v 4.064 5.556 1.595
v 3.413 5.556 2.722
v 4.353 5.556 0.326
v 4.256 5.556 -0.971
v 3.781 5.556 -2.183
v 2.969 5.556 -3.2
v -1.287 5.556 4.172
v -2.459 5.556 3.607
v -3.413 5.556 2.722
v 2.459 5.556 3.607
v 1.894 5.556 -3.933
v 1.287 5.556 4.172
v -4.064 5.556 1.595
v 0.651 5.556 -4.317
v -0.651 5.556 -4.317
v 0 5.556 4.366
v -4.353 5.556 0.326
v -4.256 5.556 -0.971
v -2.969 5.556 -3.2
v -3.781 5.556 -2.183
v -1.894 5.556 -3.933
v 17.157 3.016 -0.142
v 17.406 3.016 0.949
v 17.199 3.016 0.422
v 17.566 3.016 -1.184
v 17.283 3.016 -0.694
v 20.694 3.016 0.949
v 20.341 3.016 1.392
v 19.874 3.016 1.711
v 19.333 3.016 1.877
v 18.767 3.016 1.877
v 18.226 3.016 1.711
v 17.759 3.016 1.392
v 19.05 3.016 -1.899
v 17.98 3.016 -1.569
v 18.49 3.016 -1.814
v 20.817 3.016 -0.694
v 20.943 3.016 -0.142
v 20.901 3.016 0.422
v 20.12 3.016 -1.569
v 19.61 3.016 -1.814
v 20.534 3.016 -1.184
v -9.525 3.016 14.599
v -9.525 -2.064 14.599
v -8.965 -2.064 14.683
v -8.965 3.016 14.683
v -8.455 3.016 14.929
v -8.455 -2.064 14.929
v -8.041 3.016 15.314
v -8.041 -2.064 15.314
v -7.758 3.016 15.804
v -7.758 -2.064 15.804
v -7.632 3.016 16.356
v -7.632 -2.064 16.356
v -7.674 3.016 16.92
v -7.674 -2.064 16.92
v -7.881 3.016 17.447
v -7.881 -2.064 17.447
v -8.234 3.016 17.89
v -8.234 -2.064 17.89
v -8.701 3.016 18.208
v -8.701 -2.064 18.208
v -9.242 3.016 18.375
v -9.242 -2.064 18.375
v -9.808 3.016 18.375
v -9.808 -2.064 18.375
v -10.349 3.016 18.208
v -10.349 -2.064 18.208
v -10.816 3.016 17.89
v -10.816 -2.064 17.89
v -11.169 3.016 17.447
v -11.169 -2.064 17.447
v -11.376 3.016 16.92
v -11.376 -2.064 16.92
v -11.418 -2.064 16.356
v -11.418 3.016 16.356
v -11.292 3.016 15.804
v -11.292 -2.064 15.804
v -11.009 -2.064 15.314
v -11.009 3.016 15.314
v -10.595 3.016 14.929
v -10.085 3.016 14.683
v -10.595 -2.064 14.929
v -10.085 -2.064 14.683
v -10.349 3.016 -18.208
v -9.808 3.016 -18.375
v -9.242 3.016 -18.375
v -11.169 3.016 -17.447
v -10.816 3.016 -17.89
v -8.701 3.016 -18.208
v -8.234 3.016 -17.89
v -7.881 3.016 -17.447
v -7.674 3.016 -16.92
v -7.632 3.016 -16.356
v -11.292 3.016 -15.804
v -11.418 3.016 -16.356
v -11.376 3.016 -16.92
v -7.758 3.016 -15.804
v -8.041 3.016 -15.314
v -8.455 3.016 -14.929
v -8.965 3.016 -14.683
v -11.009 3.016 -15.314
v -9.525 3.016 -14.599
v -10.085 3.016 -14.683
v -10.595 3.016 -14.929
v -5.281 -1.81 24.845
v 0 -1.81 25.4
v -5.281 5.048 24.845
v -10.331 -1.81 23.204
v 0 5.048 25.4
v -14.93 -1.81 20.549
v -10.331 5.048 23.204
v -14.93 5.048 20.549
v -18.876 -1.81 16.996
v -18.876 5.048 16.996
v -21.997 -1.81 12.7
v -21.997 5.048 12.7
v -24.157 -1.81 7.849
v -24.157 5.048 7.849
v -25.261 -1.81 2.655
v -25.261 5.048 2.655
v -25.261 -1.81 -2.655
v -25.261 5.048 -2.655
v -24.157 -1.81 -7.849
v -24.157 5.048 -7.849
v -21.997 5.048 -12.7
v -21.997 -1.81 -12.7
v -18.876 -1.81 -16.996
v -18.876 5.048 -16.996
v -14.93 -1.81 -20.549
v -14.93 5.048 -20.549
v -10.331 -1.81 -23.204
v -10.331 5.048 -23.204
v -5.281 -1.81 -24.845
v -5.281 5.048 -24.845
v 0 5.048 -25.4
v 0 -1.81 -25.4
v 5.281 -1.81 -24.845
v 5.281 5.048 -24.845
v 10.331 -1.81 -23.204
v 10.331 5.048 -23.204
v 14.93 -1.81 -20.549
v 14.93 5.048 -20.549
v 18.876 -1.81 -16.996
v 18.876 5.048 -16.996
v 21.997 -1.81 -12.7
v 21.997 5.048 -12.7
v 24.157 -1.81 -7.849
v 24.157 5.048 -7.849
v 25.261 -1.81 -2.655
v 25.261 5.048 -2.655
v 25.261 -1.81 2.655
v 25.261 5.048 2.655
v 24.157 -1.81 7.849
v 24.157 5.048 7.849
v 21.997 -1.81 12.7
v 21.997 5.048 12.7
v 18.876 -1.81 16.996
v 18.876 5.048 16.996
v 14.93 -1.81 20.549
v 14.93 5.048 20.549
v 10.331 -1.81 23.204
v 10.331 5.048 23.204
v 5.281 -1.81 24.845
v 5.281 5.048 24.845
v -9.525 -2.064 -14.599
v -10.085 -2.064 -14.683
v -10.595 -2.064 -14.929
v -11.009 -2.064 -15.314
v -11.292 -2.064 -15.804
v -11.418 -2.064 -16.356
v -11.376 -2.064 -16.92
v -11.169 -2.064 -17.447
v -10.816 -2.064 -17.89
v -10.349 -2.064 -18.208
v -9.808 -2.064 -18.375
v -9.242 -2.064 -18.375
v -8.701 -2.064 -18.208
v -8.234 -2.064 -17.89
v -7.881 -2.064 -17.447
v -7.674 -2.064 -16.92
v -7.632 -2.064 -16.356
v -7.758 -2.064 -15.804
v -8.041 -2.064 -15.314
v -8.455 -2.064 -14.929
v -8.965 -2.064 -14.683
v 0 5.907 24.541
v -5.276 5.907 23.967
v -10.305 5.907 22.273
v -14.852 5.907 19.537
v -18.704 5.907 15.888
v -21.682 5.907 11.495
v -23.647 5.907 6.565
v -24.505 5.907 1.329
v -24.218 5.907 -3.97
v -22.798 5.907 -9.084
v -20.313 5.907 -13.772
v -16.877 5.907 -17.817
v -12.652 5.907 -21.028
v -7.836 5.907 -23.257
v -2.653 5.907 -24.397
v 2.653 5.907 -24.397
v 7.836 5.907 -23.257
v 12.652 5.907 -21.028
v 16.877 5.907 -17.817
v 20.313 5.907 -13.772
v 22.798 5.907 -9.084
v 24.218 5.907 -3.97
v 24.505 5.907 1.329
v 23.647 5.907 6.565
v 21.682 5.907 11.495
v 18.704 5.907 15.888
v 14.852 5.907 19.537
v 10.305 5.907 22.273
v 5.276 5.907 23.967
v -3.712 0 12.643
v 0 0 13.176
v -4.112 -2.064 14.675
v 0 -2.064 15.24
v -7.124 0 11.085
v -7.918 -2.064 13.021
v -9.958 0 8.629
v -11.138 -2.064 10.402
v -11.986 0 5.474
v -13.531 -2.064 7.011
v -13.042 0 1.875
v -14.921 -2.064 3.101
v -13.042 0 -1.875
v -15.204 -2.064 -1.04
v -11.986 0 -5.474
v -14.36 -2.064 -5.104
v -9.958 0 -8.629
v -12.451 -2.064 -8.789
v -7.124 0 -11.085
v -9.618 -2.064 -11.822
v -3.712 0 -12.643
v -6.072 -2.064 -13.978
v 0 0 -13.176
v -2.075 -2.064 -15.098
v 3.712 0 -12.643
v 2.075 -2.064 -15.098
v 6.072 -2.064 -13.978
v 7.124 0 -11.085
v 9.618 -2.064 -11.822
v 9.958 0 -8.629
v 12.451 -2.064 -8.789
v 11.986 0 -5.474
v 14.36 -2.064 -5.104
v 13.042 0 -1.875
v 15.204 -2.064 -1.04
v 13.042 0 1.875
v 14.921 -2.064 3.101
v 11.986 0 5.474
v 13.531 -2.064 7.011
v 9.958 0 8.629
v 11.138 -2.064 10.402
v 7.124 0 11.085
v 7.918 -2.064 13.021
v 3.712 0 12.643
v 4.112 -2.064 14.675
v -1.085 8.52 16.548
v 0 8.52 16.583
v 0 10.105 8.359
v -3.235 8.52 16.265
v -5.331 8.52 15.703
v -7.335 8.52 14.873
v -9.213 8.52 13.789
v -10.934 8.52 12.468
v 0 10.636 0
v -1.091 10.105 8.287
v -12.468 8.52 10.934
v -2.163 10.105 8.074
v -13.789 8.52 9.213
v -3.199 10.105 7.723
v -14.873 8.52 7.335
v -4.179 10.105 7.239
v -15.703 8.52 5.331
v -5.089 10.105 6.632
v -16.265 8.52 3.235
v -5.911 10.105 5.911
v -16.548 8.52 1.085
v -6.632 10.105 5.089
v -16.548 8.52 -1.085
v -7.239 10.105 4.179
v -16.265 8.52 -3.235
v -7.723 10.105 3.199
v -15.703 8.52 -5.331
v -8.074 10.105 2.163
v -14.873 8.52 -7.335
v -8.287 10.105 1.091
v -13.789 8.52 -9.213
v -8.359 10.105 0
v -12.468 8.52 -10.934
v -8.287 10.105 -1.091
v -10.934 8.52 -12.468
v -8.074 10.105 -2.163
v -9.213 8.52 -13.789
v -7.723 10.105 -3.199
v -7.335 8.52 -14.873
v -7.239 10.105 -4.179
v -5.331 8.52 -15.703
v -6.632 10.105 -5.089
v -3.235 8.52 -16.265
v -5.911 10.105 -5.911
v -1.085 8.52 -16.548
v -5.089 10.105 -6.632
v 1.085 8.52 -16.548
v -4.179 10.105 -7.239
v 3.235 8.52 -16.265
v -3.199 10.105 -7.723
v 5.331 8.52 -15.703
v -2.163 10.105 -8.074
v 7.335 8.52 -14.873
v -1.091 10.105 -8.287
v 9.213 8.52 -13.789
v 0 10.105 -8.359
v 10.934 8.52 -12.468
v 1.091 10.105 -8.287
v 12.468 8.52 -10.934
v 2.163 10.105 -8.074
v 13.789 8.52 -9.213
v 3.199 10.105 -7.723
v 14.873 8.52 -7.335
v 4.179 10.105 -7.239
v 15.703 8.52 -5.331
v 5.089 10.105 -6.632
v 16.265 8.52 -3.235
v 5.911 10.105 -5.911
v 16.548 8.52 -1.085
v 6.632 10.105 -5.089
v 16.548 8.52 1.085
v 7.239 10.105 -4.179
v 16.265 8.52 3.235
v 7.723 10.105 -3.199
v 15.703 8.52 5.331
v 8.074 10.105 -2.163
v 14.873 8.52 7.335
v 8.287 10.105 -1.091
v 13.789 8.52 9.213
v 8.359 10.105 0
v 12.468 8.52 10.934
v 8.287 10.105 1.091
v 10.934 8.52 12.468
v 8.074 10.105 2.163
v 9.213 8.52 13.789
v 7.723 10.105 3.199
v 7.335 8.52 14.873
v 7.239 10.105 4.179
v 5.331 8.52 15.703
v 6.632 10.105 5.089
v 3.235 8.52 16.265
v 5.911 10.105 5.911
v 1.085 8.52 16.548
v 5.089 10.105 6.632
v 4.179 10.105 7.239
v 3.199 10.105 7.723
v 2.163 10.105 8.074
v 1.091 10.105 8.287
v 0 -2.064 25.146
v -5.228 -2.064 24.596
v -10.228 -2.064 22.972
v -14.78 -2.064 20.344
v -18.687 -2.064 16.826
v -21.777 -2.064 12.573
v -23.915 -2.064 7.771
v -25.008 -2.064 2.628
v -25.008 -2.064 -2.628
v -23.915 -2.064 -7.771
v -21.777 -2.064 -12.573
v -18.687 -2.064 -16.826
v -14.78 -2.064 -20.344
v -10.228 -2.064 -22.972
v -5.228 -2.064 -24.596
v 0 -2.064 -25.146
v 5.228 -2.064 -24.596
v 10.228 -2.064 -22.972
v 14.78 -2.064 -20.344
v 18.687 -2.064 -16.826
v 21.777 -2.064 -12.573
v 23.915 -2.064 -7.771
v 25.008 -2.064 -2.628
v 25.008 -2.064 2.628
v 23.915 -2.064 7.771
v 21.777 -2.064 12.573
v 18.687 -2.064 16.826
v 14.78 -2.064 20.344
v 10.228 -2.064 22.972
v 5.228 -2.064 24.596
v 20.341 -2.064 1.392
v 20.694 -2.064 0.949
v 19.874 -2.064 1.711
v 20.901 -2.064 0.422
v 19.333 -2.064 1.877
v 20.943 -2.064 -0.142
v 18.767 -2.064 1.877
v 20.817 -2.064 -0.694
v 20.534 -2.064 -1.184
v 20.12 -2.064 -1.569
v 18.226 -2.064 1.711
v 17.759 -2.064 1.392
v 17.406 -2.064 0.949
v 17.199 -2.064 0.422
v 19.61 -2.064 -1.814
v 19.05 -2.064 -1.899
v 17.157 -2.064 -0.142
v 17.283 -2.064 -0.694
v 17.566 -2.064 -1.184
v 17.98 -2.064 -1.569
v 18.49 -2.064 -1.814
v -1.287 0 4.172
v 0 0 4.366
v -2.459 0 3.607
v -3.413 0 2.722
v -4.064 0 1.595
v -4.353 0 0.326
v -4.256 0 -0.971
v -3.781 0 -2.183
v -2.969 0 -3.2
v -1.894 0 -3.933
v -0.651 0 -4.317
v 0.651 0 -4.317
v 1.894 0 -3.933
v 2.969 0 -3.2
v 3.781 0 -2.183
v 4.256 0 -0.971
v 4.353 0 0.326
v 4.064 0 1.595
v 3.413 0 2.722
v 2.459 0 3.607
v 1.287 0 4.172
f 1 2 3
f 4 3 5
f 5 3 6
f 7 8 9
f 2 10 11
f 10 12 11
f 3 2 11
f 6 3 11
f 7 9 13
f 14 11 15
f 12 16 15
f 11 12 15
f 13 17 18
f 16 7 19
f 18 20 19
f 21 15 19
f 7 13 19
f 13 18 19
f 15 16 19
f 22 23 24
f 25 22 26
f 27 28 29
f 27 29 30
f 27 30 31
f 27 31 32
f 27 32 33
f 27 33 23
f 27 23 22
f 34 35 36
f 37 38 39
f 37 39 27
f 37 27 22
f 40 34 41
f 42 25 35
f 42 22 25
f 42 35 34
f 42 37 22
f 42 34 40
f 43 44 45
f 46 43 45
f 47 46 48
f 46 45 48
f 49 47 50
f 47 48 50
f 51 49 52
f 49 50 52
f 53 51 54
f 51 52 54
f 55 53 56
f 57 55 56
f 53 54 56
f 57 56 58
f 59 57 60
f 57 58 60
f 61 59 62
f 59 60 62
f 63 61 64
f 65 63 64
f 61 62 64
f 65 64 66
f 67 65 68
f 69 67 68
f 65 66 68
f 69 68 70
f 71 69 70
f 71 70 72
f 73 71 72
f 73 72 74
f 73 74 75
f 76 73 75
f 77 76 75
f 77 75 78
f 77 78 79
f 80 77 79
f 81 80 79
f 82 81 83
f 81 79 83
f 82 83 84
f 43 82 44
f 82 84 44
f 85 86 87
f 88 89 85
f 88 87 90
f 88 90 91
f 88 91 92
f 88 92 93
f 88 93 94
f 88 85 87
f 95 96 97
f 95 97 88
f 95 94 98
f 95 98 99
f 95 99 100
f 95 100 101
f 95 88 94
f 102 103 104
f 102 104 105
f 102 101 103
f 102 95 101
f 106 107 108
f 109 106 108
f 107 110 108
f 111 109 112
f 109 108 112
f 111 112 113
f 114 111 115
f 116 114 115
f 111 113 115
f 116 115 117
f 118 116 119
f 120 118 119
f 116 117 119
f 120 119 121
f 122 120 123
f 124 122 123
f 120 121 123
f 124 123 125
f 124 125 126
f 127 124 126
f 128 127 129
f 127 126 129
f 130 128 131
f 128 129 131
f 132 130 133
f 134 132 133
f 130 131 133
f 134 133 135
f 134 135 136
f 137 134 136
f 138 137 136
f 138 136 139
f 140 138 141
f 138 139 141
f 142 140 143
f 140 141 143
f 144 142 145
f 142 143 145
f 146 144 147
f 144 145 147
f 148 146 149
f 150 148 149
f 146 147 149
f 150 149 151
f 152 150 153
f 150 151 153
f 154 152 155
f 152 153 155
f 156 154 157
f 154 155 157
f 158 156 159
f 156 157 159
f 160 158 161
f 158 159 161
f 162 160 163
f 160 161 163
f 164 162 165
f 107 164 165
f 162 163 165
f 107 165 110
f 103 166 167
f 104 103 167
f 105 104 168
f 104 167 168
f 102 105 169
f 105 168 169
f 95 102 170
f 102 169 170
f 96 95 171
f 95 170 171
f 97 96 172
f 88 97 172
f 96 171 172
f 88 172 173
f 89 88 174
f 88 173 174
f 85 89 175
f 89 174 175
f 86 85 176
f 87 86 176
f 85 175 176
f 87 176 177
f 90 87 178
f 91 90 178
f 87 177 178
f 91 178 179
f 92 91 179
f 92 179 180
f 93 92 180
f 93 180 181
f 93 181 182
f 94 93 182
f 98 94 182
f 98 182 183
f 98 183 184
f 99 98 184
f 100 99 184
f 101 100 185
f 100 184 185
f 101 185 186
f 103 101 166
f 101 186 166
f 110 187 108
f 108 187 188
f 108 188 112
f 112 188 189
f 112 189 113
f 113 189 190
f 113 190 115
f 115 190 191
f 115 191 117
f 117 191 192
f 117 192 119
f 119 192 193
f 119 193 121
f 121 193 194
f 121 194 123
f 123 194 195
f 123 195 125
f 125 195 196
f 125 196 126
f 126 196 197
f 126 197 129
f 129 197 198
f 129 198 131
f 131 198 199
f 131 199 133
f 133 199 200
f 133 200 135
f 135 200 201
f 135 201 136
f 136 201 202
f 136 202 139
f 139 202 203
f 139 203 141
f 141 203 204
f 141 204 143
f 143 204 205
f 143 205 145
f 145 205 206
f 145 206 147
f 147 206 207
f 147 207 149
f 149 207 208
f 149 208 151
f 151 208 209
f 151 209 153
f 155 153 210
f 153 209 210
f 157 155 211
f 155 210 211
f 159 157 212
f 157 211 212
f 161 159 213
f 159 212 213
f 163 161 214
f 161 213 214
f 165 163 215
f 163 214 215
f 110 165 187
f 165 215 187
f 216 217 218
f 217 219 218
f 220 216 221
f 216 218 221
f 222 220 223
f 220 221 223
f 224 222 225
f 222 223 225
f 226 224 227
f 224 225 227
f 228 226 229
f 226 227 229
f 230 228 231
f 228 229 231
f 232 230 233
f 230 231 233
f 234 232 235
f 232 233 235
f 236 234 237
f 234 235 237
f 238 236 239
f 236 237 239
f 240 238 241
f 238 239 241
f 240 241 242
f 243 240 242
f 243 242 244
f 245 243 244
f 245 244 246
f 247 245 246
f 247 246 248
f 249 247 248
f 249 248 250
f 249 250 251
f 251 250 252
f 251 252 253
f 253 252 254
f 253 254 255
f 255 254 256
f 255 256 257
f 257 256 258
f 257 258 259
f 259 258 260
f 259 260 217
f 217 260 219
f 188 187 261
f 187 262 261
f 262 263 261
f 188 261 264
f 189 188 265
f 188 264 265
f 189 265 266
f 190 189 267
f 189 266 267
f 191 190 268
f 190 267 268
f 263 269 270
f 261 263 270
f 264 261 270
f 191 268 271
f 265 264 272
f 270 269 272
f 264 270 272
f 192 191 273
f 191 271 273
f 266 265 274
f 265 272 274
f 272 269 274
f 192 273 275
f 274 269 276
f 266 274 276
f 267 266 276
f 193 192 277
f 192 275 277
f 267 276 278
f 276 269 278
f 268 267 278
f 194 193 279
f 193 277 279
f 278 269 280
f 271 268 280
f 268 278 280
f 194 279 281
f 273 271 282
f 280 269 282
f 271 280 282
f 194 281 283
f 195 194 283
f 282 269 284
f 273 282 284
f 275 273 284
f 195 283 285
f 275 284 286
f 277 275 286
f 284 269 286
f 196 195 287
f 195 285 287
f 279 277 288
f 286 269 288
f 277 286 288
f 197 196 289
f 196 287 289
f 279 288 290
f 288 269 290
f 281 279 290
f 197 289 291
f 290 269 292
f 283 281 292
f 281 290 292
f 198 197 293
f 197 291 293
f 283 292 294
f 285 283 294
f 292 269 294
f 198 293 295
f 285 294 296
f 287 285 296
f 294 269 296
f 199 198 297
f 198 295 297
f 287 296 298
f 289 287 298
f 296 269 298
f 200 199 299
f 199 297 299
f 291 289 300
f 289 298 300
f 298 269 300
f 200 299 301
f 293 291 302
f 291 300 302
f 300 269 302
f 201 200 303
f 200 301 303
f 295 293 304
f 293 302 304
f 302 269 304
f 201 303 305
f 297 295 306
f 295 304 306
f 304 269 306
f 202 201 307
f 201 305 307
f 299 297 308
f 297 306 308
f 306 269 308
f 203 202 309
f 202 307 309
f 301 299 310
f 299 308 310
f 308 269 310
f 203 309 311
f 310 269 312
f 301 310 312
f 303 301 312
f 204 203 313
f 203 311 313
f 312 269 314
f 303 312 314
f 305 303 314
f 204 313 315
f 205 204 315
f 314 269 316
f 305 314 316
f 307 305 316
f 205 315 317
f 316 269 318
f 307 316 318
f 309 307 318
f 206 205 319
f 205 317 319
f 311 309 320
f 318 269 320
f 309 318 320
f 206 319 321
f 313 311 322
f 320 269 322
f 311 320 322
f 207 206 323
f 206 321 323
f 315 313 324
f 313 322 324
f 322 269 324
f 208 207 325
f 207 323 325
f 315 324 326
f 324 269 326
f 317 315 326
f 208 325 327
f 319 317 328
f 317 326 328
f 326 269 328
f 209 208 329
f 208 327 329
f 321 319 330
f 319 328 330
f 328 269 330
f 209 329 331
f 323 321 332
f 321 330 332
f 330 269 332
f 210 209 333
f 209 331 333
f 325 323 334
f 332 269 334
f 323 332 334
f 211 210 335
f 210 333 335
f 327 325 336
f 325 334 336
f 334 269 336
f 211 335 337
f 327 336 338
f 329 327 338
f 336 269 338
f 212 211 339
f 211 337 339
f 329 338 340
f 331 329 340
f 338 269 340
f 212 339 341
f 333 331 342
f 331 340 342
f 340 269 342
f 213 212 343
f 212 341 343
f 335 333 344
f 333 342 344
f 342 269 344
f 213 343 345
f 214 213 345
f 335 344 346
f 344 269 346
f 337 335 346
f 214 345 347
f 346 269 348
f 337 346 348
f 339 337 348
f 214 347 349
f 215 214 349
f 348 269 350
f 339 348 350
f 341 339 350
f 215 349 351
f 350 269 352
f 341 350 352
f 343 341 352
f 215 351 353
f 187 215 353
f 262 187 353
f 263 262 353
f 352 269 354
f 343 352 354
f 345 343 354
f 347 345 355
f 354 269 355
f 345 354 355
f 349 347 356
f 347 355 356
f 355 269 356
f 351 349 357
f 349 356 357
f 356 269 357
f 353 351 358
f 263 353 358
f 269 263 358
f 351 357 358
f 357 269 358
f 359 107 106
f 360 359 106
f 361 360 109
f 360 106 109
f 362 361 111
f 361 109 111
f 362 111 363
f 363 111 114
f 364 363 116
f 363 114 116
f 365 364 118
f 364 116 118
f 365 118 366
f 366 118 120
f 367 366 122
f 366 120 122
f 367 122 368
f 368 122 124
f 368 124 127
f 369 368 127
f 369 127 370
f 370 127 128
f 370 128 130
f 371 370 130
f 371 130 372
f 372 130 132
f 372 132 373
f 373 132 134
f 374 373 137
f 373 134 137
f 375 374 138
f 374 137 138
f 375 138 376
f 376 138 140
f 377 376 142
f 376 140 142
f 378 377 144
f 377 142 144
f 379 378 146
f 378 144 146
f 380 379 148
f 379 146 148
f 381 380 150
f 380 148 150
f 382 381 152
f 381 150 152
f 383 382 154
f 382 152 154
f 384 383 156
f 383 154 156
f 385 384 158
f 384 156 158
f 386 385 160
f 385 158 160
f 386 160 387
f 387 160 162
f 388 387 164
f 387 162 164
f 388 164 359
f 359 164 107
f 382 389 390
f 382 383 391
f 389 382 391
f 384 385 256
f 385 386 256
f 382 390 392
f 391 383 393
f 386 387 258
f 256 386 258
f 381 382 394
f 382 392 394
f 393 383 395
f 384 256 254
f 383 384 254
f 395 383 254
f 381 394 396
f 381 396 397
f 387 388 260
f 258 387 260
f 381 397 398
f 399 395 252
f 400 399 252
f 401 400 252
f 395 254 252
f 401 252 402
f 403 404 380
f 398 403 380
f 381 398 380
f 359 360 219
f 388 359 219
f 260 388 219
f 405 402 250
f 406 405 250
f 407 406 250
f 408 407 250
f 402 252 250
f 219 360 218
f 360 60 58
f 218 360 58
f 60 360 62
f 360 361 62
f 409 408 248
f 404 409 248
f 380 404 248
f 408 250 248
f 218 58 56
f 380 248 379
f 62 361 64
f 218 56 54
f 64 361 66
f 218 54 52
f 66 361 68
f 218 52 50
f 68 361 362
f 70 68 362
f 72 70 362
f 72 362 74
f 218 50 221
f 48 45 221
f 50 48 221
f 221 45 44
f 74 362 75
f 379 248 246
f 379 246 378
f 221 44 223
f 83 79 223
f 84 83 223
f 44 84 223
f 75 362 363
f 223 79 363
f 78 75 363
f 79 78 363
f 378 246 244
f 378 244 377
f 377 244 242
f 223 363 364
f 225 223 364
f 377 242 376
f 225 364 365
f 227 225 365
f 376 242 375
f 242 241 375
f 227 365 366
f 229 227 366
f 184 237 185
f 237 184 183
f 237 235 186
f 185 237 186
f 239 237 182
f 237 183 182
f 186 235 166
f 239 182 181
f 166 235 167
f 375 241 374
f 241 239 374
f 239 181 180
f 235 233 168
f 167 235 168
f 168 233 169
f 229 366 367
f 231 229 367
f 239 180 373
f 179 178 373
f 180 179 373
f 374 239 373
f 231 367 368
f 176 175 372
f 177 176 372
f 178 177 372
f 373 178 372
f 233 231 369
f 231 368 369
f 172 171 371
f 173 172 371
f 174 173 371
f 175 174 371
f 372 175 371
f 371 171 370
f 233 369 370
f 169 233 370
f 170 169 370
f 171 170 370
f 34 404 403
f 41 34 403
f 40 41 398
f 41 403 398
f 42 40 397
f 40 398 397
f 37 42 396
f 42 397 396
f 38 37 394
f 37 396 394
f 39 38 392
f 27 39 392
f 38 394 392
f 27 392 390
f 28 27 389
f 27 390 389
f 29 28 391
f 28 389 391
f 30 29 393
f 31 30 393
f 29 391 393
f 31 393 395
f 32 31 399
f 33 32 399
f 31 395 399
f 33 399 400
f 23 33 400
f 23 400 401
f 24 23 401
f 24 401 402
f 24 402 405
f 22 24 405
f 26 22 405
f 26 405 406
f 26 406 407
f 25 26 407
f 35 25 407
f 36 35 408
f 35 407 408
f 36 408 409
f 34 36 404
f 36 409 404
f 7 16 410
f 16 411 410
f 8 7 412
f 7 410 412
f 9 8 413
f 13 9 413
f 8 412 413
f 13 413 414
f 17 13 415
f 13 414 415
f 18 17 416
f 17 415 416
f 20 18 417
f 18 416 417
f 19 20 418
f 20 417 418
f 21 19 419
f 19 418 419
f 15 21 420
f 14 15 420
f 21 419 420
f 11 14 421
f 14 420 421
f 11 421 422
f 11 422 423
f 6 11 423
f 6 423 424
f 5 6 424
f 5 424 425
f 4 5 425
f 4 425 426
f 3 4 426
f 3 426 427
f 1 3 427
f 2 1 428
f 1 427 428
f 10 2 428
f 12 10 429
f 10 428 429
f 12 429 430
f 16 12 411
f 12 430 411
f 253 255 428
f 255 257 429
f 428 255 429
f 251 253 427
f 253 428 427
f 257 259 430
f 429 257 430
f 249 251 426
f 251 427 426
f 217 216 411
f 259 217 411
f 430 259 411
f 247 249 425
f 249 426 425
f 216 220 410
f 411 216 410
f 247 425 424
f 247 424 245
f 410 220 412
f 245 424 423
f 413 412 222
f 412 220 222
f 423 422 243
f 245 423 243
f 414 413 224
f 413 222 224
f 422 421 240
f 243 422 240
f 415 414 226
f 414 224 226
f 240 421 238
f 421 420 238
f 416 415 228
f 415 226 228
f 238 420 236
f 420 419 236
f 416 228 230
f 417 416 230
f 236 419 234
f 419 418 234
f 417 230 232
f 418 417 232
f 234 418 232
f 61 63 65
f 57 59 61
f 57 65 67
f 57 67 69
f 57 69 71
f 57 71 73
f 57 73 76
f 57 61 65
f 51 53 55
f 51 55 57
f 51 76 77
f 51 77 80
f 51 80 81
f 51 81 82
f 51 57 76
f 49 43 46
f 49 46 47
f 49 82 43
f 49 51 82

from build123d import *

# Parameters (mm, degrees)
CHAMFER2_SIZE      = 0.254
CHAMFER3_SIZE      = 0.508
SKETCH4_R          = 1.89865
CUT_EXTRUDE1_DEPTH = 5.08


with BuildPart() as part:
    # Sketch1 → Revolve1 (revolve)
    with BuildSketch(Plane.XY, mode=Mode.PRIVATE) as revolve1_sk:
        with BuildLine():
            Line((0, 5.55625), (4.365625, 5.55625))
            Line((4.365625, 5.55625), (4.365625, 0))
            Line((4.365625, 0), (13.17625, 0))
            Line((13.17625, 0), (15.24, -2.06375))
            Line((15.24, -2.06375), (25.4, -2.06375))
            Line((25.4, -2.06375), (25.4, 5.55625))
            ThreePointArc((25.4, 5.55625), (12.951509565, 9.353797823), (0, 10.63625))
            Line((0, 10.63625), (0, 5.55625))
        make_face()
    revolve(revolve1_sk.sketch.rotate(Axis((0, 18.150046132, 0), (0, -1, 0)), 90), axis=Axis((0, 18.150046132, 0), (0, -1, 0)))

    # Chamfer2
    chamfer2_edges = [part.edges().sort_by_distance(p)[0] for p in [
        (0, -2.06375, -25.4),
    ]]
    chamfer(chamfer2_edges, length=CHAMFER2_SIZE)

    # Chamfer3
    # the kernel refuses this chamfer: 0.943428571, 0.508 mm, written as the material it takes off along each edge
    with BuildSketch(Plane(origin=(0, 5.55625, 0), x_dir=(0, 0, 1), z_dir=(1, 0, 0))) as chamfer3_piece_1:
        with BuildLine():
            Line((25.4, CHAMFER3_SIZE), (24.541242074, -0.350757926))
            ThreePointArc((24.541242074, -0.350757926), (24.955132553, -0.183462114), (25.4, 0))
            Line((25.4, 0), (25.4, CHAMFER3_SIZE))
        make_face()
    revolve(axis=Axis((0, 5.55625, 0), (0, -1, 0)), mode=Mode.SUBTRACT)

    # Sketch4 → Cut-Extrude1 (cut)
    with BuildSketch(Plane.XZ.offset(2.06375)):
        with Locations(Location((19.05, 0, 0), (0, 0, 270))):
            Circle(SKETCH4_R)
        with Locations(Location((-9.525, 16.497783942, 0), (0, 0, 270))):
            Circle(SKETCH4_R)
        with Locations(Location((-9.525, -16.497783942, 0), (0, 0, 90))):
            Circle(SKETCH4_R)
    extrude(amount=-CUT_EXTRUDE1_DEPTH, mode=Mode.SUBTRACT)


solid = part.part
